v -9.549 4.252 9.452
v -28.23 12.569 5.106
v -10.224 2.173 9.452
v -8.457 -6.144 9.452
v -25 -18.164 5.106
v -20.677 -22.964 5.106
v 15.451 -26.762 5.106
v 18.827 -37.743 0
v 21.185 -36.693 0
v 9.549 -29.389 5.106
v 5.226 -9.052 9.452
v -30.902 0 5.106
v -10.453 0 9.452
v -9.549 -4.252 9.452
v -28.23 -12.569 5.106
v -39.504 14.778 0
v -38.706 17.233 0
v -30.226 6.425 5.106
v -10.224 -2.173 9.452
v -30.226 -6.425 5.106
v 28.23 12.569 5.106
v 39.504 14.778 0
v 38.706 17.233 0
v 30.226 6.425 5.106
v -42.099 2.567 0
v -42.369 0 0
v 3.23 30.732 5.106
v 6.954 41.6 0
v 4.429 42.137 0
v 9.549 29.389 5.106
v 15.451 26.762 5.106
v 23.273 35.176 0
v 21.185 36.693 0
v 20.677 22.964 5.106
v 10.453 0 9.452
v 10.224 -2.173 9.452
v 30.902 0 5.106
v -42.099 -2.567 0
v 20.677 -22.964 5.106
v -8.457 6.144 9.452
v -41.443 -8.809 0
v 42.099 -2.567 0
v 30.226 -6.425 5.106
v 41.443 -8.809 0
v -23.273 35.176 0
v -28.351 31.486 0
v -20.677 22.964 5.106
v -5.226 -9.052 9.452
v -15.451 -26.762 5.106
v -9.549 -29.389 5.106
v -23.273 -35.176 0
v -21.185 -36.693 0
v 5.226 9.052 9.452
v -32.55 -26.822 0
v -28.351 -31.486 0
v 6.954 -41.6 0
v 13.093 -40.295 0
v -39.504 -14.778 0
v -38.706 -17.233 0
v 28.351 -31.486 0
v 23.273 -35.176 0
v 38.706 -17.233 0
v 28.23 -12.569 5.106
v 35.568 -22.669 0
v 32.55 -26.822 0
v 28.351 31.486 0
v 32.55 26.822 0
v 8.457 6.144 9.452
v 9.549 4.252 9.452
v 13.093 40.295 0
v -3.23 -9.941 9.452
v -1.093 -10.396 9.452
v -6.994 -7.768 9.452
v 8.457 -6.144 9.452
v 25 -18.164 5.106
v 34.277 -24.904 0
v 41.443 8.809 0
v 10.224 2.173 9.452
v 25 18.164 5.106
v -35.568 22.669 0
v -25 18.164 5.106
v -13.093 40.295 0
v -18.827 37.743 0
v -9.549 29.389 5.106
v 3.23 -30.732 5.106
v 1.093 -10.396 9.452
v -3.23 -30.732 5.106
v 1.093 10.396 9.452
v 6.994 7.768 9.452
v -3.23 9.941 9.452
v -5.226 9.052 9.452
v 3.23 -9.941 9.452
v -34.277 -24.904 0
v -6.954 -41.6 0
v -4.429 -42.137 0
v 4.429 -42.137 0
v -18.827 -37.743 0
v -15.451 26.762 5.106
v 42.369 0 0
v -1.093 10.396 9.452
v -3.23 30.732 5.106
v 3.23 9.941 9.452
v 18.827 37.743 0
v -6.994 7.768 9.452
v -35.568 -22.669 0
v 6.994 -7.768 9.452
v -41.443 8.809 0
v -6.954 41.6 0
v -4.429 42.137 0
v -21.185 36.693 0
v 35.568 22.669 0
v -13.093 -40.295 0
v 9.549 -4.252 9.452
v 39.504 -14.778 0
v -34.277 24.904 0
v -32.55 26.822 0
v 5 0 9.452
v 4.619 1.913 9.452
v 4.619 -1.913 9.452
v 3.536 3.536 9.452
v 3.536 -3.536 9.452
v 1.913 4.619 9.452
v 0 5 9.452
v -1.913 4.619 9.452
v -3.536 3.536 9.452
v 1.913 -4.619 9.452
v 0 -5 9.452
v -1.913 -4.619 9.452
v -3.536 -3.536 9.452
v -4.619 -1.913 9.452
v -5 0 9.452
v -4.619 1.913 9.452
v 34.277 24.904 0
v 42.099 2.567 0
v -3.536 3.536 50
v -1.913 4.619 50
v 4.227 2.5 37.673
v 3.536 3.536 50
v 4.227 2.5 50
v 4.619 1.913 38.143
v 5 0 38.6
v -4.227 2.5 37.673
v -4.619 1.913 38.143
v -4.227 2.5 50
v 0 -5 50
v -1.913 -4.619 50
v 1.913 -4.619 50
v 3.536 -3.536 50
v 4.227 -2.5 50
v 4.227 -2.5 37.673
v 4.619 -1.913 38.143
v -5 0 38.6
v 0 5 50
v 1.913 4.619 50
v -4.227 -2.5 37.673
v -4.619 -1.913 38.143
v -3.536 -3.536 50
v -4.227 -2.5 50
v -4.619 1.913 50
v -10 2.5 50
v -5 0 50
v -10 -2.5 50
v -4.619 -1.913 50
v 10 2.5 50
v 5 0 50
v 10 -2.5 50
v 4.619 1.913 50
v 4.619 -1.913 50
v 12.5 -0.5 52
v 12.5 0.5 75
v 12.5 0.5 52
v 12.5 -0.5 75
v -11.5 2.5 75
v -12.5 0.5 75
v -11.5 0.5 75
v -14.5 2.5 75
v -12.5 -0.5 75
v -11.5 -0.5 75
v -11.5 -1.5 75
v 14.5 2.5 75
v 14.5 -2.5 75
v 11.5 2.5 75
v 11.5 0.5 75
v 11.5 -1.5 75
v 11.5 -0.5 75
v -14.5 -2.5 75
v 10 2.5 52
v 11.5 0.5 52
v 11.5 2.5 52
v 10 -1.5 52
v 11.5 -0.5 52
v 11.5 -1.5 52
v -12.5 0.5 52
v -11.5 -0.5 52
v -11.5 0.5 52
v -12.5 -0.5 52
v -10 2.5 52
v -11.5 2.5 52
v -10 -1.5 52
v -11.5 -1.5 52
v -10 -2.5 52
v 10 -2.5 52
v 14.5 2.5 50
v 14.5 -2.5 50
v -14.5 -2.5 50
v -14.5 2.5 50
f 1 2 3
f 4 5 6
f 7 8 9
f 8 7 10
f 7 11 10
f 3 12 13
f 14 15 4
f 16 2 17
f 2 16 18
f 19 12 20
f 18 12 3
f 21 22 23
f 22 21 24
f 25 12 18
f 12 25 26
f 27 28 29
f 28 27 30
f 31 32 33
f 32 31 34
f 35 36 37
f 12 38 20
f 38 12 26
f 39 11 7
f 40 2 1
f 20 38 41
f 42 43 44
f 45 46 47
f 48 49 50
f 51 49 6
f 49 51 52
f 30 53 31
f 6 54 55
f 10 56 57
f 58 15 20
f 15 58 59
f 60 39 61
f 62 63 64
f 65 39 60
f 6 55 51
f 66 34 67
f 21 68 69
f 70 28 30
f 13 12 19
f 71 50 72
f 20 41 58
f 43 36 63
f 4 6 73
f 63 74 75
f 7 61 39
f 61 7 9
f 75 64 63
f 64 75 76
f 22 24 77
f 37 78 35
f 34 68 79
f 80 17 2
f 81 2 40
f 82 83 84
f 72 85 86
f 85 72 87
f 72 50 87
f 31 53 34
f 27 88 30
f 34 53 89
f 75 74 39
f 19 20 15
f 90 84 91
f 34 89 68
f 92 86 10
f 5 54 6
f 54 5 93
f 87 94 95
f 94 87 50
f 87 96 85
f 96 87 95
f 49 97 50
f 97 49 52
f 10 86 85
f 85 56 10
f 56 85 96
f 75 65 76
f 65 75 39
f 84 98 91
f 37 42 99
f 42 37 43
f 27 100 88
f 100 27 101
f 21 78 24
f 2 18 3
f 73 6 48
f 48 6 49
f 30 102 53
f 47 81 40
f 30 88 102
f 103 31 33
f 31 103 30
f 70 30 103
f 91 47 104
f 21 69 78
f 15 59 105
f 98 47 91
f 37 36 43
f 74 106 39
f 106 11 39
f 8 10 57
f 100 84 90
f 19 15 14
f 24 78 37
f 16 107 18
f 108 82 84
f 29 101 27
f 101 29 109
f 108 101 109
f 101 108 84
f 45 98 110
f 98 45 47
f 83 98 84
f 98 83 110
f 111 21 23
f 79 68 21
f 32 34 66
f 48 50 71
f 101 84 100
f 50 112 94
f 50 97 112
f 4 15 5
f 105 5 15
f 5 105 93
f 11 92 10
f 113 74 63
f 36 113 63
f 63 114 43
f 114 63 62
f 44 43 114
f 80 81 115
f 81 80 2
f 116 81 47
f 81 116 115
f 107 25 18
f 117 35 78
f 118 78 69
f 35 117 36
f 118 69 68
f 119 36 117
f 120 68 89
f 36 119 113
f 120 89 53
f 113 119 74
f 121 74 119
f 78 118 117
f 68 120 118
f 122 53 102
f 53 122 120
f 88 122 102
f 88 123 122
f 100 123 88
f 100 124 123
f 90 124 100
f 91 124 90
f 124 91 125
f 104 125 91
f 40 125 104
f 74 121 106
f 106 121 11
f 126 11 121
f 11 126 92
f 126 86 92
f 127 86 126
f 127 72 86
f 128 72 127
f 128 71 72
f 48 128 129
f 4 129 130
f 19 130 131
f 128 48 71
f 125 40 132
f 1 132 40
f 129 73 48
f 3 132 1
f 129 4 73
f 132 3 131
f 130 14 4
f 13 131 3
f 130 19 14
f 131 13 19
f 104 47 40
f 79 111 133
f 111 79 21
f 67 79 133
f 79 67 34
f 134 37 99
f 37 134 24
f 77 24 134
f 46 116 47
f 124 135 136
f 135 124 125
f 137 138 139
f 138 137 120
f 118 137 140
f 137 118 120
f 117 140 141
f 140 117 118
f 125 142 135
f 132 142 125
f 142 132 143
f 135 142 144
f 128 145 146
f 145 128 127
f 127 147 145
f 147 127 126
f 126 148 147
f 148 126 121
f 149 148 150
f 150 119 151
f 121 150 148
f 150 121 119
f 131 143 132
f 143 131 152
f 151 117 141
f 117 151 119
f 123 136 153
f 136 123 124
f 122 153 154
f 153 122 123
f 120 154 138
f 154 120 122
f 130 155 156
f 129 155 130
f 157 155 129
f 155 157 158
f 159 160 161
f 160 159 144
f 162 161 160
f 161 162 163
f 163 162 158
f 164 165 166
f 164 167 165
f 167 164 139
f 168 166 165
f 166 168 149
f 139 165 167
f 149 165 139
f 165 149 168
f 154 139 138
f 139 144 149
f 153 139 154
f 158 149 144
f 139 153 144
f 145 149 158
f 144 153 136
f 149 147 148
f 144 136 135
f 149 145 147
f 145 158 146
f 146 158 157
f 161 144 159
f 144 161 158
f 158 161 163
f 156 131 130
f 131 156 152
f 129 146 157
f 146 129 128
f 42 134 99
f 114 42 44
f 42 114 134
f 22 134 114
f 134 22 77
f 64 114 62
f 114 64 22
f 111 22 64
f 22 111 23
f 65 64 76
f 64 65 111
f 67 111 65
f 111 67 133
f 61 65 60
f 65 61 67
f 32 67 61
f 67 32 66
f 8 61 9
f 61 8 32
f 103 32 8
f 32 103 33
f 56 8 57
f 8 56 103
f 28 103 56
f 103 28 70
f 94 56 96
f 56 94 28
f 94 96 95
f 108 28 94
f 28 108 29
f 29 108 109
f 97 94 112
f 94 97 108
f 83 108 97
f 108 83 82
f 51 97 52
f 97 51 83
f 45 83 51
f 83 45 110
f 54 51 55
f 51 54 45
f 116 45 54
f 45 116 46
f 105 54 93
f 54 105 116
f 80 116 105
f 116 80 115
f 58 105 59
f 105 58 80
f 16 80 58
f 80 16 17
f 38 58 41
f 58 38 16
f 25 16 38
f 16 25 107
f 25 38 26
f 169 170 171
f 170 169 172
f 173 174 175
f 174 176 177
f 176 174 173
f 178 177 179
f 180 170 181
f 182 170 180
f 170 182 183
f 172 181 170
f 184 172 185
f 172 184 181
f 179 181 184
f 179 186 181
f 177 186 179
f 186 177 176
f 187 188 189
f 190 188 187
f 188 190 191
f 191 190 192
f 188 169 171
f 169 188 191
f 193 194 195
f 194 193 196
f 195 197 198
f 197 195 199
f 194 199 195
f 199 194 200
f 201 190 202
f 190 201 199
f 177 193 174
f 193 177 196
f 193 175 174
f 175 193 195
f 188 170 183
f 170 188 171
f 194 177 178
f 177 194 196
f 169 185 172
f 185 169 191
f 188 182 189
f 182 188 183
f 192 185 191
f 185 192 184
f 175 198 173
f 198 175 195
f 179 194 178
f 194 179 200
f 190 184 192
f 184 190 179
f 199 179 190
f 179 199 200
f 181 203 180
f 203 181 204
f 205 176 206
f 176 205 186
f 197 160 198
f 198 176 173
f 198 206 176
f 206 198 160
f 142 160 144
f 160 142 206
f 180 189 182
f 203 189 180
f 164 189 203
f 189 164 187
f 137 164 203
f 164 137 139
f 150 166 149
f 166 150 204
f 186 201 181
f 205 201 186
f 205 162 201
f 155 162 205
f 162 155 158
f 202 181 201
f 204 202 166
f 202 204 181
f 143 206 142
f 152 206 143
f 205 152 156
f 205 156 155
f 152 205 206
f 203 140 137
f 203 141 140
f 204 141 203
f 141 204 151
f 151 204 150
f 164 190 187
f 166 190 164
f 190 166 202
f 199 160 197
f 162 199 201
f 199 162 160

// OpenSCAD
leg_height = 50;
leg_radius = 5;
foot_radius = 100;
foot_bias = -90;


cam_height = 23;
cam_width = 25;
cam_holder_strength = 2;
cam_side_clamp_width = 1;
cam_depth = 1;
cam_cable_width = 20;
cam_overhang_height = 15;

//stand
difference() {
union() {
translate([0,0,foot_bias])sphere(foot_radius);
cylinder(leg_height,leg_radius,leg_radius);
}
translate([0,0,-250])cube([500,500,500],center=true);
}



//holder
difference() { //cut hole for cable
translate([0,0,leg_height]) {
    translate([-(cam_width+2*cam_holder_strength)/2,-(cam_depth+2*cam_holder_strength)/2,0]) {
        rotate([-90,0,0])linear_extrude(cam_depth+2*cam_holder_strength)polygon([[0,0],[cam_width/2,0],[cam_width/2,cam_overhang_height]]);
        translate([cam_width+cam_holder_strength*2,0,0])rotate([-90,0,0])linear_extrude(cam_depth+2*cam_holder_strength)polygon([[0,0],[-cam_width/2,0],[-cam_width/2,cam_overhang_height]]);

        difference() {
        cube([cam_width+2*cam_holder_strength,cam_depth+2*cam_holder_strength,cam_height+cam_holder_strength]);
        translate([cam_holder_strength,cam_holder_strength,cam_holder_strength]) { 
            cube([cam_width,cam_depth,cam_height]);
            translate([cam_side_clamp_width,-cam_depth,0]) {
                cube(cam_width-2*cam_side_clamp_width,cam_height,400);
            }
        }
        }
    }
}

translate([-cam_cable_width/2,-50,leg_height]) { //cable hole
    cube([cam_cable_width,100,cam_holder_strength]);
}

}
